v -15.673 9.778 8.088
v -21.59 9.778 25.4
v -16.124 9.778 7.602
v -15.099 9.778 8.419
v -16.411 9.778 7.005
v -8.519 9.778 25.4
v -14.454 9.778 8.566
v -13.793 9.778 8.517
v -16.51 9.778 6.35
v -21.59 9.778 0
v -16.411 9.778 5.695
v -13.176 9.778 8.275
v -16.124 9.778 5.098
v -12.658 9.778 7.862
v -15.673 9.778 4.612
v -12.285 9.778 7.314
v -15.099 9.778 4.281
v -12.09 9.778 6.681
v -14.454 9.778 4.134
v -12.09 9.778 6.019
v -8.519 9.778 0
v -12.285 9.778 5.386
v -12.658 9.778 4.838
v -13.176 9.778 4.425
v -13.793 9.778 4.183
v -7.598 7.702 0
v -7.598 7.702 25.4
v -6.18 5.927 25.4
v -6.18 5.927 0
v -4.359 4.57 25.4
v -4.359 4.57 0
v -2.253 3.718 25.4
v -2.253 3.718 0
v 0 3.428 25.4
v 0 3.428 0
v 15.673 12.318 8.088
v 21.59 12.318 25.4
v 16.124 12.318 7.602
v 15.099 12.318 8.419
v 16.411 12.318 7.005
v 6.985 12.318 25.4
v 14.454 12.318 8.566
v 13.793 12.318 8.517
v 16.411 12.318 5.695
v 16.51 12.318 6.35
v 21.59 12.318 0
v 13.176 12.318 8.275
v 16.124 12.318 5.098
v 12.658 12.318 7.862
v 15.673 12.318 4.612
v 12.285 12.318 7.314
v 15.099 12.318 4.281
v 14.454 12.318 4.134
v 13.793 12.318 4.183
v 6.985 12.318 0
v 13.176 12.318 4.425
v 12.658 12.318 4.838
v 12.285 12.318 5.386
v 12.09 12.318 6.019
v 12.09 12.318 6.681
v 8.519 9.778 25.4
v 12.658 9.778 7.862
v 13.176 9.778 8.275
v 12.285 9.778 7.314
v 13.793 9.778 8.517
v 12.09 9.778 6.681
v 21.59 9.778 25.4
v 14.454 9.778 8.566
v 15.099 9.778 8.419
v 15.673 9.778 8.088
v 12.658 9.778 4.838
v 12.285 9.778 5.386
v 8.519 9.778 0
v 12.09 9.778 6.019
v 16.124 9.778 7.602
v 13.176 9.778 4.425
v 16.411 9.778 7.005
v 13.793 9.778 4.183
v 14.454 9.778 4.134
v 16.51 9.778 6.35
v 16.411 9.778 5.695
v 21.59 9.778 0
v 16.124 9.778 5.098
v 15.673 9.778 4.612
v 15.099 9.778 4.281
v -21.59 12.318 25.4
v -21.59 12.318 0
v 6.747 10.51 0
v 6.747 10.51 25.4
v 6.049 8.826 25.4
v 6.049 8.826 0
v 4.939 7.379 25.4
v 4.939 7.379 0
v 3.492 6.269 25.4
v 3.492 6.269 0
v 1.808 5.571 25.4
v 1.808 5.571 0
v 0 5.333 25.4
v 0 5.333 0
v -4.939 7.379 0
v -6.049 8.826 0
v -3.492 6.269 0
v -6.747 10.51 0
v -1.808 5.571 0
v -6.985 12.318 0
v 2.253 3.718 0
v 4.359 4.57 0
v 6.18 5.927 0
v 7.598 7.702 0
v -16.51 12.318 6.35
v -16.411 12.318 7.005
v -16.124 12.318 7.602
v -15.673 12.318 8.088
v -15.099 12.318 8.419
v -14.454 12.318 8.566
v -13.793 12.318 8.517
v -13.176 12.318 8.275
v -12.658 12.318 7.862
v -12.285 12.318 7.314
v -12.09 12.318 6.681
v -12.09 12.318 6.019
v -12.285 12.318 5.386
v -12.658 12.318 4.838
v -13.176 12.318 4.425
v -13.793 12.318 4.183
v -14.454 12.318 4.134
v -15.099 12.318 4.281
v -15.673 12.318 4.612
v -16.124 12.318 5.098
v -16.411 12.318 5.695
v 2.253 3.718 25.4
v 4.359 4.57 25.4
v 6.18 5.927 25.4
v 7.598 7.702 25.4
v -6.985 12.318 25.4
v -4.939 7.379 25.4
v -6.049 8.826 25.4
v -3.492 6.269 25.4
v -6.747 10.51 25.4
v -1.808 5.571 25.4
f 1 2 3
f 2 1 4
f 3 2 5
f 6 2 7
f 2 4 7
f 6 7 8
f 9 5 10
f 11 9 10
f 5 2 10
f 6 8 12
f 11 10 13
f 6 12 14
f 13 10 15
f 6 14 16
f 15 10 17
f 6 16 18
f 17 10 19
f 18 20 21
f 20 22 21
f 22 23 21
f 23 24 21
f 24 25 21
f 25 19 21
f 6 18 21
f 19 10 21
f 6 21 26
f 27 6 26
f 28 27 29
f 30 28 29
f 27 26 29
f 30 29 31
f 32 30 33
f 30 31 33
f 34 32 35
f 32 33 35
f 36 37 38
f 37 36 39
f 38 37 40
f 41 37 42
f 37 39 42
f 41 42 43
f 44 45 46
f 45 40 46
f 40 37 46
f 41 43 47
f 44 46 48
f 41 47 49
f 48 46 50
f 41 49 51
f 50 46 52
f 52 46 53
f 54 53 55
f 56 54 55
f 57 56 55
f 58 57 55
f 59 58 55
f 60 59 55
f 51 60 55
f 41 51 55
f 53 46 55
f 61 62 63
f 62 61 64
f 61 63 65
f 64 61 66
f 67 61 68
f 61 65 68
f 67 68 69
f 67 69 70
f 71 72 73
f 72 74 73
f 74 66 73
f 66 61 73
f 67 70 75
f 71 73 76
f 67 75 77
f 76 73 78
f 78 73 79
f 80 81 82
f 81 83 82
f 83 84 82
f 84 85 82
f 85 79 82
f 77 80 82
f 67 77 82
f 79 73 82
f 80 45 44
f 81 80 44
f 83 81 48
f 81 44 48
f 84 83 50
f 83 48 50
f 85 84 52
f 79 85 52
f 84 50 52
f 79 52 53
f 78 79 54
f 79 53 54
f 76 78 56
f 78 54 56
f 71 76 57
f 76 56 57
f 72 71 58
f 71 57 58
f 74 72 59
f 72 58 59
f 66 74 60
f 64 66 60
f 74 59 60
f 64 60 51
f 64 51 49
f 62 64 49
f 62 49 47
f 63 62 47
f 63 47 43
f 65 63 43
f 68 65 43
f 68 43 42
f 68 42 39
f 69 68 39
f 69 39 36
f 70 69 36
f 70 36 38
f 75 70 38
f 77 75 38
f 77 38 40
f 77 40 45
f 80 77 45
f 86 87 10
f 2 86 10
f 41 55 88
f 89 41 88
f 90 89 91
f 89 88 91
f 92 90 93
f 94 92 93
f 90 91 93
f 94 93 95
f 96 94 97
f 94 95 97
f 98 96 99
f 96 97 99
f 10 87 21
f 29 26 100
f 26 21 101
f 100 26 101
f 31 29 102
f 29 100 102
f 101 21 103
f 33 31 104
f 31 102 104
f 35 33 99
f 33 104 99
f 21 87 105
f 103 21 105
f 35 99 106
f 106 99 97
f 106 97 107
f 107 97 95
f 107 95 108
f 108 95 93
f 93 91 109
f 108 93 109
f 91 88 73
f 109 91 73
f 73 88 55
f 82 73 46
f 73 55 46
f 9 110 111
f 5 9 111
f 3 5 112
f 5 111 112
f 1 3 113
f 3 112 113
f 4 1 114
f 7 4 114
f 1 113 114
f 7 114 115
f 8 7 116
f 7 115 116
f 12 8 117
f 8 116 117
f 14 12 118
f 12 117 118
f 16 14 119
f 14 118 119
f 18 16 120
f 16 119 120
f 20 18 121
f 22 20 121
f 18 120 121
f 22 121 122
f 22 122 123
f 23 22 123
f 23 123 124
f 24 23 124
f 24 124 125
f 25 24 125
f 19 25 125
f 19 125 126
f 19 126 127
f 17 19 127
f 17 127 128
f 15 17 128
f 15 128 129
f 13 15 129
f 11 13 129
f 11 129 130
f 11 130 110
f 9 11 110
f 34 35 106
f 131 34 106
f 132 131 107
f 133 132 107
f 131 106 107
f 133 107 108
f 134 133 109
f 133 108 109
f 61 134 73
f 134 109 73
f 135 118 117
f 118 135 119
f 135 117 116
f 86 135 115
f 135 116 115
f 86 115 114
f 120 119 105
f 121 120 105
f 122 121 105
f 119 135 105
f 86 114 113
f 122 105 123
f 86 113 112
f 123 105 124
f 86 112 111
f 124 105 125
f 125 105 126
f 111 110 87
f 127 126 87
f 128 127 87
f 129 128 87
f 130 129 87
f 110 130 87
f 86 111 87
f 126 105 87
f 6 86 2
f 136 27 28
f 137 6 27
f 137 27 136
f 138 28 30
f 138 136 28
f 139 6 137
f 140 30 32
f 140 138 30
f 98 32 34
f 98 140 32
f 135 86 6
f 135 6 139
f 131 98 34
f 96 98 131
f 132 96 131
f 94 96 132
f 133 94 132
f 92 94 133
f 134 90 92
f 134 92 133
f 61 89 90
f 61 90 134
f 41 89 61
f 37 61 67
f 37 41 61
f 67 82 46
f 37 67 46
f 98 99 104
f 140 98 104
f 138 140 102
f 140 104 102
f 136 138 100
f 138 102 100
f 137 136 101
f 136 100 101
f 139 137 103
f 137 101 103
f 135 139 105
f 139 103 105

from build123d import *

# Parameters (mm, degrees)
BOSS_EXTRUDE2_DEPTH = 25.4
SKETCH2_R           = 2.2225
CUT_EXTRUDE1_DEPTH  = 25.4


with BuildPart() as part:
    # Sketch1 → Boss-Extrude2 (new body)
    with BuildSketch(Plane.XY):
        with BuildLine():
            Line((8.519418994, 9.778156255), (21.59, 9.778156255))
            Line((21.59, 9.778156255), (21.59, 12.318156255))
            Line((21.59, 12.318156255), (6.985, 12.318156255))
            ThreePointArc((6.985, 12.318156255), (0, 5.333156255), (-6.985, 12.318156255))
            Line((-6.985, 12.318156255), (-21.59, 12.318156255))
            Line((-21.59, 12.318156255), (-21.59, 9.778156255))
            Line((-21.59, 9.778156255), (-8.519418994, 9.778156255))
            ThreePointArc((-8.519418994, 9.778156255), (0, 3.428156255), (8.519418994, 9.778156255))
        make_face()
    extrude(amount=BOSS_EXTRUDE2_DEPTH)

    # Sketch2 → Cut-Extrude1 (cut)
    with BuildSketch(Plane(origin=(0, 12.318156255, 0), x_dir=(1, 0, 0), z_dir=(0, 1, 0))):
        with Locations((-14.2875, -6.35)):
            Circle(SKETCH2_R)
        with Locations((14.2875, -6.35)):
            Circle(SKETCH2_R)
    extrude(amount=-CUT_EXTRUDE1_DEPTH, mode=Mode.SUBTRACT)


solid = part.part
